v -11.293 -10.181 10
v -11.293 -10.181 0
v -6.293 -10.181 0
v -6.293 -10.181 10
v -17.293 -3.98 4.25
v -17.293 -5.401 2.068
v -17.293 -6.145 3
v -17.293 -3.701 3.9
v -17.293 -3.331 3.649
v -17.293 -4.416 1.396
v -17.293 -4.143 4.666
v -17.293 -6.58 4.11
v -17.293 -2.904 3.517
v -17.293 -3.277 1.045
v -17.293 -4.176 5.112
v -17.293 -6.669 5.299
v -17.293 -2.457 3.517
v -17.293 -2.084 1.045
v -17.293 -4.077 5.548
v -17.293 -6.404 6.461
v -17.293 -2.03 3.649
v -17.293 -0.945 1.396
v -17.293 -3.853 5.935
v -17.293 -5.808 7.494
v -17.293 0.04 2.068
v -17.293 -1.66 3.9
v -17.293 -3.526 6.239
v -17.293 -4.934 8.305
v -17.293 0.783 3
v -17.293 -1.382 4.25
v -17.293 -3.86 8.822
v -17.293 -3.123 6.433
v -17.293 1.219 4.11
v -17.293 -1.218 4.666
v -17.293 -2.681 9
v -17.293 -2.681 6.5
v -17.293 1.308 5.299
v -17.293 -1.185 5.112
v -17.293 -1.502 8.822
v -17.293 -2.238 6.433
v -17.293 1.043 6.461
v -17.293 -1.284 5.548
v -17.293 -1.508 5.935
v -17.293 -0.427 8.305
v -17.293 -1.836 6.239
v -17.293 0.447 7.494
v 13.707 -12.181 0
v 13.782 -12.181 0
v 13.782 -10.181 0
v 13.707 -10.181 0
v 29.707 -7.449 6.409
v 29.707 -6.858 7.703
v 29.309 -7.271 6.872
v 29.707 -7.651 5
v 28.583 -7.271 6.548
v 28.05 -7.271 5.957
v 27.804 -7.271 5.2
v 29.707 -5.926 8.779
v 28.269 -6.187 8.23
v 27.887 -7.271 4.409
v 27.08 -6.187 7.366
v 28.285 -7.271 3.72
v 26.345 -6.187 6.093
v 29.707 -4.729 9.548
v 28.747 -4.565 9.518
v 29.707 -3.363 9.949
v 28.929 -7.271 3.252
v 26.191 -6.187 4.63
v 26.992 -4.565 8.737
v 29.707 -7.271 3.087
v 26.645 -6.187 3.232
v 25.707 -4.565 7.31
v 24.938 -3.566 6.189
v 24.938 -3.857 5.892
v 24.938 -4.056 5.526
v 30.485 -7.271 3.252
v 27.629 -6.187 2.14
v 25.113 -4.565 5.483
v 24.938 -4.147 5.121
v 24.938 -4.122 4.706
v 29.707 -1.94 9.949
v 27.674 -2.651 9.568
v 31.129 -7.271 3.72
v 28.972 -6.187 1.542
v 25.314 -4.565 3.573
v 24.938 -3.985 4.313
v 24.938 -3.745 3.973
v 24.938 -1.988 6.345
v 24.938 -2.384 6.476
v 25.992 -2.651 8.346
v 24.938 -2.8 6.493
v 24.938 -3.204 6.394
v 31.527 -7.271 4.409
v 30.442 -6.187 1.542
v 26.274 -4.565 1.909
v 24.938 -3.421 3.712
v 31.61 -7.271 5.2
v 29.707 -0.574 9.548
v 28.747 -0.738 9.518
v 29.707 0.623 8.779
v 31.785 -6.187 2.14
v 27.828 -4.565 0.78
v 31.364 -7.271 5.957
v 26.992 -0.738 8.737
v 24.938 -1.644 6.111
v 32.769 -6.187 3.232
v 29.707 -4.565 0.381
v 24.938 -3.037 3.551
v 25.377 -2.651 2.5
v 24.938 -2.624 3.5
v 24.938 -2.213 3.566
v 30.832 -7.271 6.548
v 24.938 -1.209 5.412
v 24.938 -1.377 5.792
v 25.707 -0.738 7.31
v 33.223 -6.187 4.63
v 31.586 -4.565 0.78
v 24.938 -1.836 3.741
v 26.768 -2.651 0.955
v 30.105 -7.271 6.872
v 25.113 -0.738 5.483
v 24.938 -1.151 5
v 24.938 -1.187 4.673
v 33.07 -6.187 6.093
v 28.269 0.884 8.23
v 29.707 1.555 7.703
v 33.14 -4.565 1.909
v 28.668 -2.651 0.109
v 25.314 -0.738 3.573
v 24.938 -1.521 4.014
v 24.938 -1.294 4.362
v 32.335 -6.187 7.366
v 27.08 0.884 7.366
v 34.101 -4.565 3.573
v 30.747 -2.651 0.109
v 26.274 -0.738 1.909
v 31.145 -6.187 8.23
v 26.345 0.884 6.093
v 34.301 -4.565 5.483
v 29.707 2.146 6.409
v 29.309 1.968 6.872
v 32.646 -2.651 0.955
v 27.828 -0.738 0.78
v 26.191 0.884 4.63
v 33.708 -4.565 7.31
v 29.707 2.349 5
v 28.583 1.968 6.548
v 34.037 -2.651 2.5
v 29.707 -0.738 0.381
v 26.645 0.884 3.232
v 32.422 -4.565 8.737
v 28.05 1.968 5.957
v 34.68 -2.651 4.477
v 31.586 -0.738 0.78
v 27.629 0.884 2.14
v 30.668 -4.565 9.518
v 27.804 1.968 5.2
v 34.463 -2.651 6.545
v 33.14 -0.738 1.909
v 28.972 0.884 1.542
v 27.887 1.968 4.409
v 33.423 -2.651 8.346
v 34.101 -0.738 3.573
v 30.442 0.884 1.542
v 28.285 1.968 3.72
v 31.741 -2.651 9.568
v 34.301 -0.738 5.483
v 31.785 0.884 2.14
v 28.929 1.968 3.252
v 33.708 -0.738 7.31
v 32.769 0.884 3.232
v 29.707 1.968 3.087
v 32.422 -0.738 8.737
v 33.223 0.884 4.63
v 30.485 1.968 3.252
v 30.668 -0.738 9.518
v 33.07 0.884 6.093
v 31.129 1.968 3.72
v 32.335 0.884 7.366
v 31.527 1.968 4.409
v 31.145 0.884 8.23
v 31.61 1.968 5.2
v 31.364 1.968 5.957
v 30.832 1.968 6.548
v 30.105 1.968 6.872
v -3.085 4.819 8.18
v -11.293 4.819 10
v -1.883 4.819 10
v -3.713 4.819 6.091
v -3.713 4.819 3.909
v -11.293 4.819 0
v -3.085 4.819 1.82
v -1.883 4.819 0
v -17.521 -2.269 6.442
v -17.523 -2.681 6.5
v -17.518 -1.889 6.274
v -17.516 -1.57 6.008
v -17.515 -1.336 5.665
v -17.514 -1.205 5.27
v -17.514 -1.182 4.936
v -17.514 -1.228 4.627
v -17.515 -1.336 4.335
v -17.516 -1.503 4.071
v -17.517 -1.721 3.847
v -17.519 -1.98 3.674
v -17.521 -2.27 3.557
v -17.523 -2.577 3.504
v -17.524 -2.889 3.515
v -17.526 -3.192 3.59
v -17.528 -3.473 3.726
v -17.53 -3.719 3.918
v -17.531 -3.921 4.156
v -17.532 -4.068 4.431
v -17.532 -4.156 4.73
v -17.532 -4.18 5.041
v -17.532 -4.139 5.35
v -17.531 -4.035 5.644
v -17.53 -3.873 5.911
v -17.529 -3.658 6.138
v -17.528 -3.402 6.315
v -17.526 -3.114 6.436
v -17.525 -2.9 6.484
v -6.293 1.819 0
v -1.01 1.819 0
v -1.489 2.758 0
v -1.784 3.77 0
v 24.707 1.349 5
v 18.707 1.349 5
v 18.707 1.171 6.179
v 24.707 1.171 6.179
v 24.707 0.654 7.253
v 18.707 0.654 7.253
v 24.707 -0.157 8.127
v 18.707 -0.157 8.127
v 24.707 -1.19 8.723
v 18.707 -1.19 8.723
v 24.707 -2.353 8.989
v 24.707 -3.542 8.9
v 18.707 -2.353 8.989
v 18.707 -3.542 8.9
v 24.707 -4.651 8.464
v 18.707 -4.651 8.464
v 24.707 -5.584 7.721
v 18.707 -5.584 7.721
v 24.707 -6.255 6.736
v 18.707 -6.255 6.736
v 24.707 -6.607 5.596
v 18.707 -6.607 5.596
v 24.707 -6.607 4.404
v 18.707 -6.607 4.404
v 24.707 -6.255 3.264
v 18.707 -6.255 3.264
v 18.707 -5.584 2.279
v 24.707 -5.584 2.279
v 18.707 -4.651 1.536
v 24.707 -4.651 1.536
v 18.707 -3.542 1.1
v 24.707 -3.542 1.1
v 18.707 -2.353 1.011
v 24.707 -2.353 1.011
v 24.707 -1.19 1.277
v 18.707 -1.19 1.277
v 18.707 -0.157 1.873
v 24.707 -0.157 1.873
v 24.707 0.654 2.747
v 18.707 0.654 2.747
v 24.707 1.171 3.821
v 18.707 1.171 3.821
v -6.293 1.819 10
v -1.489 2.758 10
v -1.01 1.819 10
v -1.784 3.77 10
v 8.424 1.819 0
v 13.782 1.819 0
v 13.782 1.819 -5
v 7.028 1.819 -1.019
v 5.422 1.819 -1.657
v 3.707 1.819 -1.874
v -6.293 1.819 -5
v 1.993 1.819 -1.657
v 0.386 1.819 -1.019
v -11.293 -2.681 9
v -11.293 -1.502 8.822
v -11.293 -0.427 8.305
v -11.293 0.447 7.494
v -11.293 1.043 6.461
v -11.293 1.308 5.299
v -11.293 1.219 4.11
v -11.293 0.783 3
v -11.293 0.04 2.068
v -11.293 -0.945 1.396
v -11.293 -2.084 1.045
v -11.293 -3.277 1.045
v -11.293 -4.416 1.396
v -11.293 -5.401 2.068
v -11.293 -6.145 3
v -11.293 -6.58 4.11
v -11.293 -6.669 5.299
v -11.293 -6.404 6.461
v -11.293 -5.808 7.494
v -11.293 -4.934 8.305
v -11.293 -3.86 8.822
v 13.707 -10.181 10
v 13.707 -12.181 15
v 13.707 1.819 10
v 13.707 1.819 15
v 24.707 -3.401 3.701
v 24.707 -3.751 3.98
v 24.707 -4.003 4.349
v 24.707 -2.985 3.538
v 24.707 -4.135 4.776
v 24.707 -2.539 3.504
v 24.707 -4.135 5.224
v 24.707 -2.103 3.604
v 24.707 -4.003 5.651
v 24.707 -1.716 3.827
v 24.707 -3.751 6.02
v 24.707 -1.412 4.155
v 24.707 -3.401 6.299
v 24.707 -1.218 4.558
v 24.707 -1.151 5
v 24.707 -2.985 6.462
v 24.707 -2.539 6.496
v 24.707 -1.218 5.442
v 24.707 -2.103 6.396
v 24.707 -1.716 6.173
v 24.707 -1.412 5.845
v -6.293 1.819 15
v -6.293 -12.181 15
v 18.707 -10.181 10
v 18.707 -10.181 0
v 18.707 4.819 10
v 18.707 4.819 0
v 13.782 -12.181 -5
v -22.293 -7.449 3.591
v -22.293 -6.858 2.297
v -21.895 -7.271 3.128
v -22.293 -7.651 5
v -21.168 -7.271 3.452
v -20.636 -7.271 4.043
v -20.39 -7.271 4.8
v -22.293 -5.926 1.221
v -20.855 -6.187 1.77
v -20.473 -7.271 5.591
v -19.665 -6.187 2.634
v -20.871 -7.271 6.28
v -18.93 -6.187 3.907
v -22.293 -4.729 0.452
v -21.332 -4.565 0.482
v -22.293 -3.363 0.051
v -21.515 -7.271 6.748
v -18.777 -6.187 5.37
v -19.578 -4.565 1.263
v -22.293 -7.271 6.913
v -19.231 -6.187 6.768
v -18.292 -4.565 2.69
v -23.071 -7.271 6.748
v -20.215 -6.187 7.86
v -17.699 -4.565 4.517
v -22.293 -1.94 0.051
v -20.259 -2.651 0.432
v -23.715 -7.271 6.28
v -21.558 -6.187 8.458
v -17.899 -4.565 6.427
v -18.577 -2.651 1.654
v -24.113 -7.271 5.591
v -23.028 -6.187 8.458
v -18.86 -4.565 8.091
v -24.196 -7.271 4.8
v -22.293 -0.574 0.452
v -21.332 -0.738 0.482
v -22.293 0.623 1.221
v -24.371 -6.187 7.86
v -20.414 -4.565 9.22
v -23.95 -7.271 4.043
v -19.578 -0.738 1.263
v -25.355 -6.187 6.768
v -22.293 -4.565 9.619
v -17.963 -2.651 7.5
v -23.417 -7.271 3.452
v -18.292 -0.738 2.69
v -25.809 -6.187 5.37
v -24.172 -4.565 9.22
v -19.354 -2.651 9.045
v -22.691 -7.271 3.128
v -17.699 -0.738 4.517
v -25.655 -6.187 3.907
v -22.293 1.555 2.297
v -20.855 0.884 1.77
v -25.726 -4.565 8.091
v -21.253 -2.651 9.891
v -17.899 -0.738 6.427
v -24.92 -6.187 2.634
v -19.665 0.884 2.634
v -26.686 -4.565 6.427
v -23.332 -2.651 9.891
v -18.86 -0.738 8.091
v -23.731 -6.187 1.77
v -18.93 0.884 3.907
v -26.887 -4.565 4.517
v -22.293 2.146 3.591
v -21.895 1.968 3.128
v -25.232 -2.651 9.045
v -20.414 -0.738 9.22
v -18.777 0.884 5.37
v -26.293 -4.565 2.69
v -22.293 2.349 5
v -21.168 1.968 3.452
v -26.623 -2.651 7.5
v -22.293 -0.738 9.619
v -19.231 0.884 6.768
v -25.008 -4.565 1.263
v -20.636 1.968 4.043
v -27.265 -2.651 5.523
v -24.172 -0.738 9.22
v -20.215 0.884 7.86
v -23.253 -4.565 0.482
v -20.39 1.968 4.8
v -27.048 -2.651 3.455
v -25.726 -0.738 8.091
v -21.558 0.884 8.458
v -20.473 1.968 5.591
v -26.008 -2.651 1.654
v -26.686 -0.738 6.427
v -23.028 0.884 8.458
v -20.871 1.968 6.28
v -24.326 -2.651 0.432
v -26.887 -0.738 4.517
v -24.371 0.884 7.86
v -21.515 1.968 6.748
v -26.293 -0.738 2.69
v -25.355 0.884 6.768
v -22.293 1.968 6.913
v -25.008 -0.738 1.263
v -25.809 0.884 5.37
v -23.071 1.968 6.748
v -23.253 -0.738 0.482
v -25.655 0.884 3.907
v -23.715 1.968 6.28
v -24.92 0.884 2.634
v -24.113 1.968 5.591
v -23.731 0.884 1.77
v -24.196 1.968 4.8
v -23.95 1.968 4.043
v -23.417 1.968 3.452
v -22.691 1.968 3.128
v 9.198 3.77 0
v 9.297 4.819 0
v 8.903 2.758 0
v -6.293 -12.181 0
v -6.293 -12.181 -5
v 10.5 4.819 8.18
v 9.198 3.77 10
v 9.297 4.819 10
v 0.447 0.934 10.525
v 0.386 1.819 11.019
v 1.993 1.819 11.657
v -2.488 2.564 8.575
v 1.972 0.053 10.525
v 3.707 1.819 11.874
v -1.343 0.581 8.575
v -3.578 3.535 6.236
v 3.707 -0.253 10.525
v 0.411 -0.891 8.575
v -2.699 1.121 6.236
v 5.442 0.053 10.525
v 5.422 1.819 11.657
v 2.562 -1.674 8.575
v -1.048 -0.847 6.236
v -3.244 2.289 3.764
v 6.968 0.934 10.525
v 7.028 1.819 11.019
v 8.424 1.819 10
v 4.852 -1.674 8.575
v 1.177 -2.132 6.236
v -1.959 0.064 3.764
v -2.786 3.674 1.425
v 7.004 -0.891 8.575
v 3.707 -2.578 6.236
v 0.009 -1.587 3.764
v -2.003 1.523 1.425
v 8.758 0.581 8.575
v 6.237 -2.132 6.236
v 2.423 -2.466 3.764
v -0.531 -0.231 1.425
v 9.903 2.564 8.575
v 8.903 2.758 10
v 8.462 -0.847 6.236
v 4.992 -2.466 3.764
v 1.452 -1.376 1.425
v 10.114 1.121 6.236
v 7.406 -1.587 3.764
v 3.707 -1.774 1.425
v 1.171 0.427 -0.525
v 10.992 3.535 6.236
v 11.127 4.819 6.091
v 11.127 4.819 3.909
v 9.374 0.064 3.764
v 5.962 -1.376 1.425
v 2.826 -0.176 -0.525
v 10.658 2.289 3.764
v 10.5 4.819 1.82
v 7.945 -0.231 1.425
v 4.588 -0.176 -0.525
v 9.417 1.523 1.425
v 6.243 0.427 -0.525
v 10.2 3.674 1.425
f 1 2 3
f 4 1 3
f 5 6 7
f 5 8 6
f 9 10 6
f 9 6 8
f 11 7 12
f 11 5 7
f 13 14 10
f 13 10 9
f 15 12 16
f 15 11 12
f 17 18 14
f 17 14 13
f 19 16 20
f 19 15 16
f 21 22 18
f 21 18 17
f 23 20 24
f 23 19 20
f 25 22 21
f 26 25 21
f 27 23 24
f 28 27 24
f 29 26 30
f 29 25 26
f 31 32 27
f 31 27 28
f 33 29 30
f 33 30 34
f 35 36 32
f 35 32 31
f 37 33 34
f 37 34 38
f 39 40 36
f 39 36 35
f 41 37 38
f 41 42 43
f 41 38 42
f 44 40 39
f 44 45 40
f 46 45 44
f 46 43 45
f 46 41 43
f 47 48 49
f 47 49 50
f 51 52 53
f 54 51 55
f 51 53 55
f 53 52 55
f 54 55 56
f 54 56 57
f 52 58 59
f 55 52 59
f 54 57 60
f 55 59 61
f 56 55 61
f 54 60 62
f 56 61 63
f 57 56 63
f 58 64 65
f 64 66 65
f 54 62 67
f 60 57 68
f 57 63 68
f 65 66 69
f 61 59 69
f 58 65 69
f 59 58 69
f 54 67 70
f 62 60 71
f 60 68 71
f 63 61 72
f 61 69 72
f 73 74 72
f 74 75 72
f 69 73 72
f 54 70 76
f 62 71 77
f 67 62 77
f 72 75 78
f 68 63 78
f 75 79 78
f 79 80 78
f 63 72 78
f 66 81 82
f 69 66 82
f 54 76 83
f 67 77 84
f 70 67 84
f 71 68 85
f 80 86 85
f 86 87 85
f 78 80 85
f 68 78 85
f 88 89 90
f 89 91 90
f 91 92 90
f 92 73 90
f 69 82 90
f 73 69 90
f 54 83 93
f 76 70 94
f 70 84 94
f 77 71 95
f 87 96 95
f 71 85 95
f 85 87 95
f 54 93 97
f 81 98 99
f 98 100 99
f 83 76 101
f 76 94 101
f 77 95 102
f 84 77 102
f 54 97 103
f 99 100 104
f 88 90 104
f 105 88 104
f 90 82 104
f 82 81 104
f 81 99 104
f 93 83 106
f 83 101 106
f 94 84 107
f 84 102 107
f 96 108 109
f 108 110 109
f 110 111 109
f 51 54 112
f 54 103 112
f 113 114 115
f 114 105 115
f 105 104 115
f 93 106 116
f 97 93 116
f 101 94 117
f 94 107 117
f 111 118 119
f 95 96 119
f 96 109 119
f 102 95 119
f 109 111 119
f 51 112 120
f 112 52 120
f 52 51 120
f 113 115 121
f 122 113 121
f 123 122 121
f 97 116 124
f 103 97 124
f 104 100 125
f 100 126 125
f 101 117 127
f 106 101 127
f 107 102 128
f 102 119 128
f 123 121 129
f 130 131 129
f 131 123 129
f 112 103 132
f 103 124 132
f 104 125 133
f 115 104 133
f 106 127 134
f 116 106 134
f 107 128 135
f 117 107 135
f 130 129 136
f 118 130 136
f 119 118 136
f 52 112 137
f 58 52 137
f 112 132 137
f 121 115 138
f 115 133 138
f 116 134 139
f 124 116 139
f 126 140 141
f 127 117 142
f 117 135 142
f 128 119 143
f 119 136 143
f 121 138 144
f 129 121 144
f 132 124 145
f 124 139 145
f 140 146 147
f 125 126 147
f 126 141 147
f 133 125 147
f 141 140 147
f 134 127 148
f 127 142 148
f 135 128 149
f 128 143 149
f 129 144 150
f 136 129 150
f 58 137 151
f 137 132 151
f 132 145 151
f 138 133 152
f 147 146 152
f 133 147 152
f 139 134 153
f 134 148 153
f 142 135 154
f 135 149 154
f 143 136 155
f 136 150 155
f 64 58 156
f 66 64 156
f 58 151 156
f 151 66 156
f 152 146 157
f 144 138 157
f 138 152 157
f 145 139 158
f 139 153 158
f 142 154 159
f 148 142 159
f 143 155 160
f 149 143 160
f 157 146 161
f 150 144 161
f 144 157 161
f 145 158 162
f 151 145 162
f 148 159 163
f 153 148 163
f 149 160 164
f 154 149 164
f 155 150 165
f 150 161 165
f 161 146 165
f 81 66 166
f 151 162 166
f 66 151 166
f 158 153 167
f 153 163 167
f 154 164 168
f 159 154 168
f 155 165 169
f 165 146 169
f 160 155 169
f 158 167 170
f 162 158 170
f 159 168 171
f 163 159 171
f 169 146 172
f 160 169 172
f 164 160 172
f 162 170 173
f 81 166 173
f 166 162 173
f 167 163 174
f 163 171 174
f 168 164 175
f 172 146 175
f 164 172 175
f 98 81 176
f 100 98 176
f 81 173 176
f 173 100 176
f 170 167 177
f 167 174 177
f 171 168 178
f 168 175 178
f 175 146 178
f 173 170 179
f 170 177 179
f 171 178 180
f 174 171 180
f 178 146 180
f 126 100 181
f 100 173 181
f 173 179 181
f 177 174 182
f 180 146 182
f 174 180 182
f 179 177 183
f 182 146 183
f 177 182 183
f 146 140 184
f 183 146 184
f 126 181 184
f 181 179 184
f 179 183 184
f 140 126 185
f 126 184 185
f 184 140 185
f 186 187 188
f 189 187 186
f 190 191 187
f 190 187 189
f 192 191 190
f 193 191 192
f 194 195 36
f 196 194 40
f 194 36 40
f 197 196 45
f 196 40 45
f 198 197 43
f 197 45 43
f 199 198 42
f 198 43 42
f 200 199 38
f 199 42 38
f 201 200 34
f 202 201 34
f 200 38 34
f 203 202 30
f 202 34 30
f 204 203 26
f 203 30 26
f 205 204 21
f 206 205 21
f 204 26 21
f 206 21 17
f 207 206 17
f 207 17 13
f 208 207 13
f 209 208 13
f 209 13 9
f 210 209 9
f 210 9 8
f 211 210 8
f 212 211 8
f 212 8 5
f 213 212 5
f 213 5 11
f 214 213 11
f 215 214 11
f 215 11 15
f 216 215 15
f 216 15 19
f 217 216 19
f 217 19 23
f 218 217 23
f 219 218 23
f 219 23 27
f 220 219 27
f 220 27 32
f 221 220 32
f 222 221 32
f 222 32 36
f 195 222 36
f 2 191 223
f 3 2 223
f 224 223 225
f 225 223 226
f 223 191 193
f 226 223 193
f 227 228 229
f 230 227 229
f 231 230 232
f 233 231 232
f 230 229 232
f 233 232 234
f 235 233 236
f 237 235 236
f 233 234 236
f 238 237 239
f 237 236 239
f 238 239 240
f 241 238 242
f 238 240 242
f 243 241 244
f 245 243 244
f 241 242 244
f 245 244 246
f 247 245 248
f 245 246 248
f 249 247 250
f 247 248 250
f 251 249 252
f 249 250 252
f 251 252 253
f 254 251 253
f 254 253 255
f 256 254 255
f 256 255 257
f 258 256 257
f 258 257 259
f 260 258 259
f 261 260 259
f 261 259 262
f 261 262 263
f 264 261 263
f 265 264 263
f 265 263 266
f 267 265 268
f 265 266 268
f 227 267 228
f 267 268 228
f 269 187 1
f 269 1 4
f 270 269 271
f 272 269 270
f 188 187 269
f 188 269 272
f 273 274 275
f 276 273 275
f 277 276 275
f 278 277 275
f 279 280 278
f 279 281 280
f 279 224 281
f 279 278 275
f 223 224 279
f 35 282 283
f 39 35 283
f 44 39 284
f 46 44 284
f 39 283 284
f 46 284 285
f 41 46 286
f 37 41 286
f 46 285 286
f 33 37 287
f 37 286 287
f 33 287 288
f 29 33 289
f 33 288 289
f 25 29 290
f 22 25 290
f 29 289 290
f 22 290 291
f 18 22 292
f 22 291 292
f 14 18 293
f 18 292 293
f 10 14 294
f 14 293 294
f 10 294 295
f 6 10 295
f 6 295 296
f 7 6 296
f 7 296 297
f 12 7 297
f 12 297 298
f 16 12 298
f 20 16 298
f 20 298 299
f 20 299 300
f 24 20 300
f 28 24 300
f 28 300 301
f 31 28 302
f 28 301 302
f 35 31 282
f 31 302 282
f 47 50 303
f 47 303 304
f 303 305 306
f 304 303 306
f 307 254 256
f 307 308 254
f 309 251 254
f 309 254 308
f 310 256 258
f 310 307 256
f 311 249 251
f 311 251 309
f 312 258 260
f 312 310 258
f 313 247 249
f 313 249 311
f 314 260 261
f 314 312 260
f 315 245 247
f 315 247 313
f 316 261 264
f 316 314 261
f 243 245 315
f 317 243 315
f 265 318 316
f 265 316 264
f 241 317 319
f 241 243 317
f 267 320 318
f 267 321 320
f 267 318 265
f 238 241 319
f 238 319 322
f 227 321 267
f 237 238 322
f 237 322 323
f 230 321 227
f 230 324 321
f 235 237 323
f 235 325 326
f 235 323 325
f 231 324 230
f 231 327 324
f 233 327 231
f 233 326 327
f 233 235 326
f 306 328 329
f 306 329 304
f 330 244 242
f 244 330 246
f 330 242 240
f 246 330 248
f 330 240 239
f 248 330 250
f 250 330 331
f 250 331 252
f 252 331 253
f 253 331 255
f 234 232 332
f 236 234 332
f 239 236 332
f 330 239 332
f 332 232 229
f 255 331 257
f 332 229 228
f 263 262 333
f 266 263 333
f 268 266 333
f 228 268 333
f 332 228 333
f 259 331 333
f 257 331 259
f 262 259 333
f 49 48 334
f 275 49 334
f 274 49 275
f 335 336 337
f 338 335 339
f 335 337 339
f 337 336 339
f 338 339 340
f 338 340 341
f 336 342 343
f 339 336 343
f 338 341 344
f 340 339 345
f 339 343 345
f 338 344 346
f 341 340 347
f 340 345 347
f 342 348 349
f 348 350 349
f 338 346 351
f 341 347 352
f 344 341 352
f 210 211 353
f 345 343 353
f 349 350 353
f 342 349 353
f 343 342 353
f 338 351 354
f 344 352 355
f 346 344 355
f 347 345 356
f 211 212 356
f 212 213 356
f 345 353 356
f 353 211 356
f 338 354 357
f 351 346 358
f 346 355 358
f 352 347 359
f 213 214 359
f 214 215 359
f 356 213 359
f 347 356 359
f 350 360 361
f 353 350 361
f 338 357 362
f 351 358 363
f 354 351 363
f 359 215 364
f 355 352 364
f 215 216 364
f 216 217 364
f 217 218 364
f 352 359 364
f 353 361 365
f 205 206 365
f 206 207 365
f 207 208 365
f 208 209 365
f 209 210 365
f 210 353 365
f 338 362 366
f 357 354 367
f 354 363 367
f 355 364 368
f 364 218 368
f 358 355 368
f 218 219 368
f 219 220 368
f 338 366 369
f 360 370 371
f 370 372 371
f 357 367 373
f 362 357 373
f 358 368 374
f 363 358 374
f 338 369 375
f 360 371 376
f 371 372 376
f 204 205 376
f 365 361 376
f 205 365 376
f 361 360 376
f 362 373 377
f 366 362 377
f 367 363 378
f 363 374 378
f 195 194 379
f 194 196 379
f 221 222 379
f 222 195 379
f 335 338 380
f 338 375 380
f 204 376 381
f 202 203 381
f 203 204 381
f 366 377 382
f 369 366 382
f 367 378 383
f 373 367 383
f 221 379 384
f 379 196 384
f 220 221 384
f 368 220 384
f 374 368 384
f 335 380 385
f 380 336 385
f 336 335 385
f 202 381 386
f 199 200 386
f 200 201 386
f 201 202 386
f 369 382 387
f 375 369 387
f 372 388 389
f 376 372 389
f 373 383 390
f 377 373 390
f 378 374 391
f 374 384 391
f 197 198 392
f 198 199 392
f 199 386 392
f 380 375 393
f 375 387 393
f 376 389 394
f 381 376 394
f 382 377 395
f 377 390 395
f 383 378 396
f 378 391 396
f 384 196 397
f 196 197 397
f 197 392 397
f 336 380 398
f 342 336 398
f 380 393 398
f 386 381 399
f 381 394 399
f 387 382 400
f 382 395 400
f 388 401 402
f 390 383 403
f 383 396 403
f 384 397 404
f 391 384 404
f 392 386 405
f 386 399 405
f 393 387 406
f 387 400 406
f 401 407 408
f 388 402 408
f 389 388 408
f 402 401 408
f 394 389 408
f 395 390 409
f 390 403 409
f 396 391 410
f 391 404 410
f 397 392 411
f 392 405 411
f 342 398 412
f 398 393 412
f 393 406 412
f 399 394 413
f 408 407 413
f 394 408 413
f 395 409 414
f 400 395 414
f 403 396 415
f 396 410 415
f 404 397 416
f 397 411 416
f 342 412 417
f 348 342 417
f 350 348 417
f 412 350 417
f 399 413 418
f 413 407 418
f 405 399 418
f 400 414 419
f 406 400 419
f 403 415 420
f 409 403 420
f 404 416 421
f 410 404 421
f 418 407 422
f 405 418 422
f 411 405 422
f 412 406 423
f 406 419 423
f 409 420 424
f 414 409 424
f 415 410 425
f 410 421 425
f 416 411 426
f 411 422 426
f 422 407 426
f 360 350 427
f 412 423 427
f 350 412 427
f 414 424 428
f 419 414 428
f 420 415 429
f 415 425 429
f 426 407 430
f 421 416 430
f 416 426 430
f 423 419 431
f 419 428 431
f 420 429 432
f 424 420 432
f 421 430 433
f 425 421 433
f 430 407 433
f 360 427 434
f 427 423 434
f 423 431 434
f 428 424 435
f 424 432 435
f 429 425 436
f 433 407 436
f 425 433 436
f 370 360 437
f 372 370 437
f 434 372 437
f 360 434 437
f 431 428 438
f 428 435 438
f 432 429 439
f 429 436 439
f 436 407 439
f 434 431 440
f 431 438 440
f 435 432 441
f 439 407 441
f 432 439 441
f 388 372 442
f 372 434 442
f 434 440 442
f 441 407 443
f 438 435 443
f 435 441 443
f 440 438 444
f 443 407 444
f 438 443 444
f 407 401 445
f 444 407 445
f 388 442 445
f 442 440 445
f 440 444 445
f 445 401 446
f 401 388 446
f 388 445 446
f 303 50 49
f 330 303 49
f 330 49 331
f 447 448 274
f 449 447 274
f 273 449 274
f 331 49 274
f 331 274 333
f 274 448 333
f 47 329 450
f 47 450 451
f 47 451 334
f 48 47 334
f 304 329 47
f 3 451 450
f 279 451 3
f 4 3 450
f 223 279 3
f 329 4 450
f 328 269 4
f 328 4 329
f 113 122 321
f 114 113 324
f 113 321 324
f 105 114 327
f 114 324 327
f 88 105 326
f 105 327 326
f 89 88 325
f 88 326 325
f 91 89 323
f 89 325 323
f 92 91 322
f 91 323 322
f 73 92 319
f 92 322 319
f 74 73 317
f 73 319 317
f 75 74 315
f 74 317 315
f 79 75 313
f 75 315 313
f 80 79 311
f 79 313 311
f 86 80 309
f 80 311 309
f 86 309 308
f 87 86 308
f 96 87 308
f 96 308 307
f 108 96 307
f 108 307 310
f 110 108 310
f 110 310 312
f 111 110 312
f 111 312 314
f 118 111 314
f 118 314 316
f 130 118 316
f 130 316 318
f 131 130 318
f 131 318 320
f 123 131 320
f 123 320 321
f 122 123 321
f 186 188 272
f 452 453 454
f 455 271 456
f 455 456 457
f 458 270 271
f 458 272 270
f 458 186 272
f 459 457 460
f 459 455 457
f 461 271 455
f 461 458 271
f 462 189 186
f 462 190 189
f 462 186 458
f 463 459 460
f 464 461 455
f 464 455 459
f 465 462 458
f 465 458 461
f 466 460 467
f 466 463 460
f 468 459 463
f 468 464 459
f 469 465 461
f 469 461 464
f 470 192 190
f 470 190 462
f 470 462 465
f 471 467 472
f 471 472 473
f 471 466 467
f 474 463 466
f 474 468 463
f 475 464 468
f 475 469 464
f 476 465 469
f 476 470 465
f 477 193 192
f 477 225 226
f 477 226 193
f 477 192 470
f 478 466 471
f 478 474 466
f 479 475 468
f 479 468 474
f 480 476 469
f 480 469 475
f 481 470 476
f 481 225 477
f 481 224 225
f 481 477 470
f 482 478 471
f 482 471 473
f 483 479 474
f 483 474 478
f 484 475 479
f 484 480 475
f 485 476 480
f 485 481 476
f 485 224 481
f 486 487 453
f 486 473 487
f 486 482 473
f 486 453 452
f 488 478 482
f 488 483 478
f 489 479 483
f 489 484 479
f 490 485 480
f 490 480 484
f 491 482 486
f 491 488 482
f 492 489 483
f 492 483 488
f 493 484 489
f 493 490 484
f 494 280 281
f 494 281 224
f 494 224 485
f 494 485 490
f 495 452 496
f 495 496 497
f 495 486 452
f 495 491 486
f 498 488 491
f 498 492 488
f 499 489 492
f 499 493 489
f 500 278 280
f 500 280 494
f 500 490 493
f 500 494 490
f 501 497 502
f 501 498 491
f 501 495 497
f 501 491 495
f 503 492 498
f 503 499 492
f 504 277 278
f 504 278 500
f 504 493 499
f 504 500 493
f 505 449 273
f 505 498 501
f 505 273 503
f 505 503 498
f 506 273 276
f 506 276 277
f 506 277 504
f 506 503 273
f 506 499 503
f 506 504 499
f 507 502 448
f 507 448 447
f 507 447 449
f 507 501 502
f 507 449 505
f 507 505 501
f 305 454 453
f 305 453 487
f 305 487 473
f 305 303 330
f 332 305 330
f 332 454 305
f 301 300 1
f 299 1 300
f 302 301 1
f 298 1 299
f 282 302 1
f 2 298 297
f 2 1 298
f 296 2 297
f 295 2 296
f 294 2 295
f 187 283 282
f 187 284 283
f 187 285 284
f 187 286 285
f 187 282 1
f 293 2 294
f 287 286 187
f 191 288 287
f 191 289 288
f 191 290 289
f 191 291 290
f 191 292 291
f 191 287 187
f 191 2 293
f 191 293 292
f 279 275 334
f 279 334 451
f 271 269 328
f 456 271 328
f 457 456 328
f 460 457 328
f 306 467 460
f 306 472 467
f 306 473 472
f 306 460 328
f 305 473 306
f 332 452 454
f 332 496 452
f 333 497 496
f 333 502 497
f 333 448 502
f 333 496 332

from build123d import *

# Parameters (mm, degrees)
SKETCH1_W            = 30
SKETCH1_H            = 15
BOSS_EXTRUDE1_DEPTH  = 10
SKETCH2_W            = 20
SKETCH2_H            = 14
BOSS_EXTRUDE2_DEPTH  = 5
SKETCH3_W            = 20.074773711
SKETCH3_H            = 14
BOSS_EXTRUDE3_DEPTH  = 5
SKETCH4_W            = 20
SKETCH4_H            = 10
BOSS_EXTRUDE4_DEPTH  = 2
SKETCH5_R            = 4
BOSS_EXTRUDE6_DEPTH  = 6
SKETCH6_R            = 4
BOSS_EXTRUDE7_DEPTH  = 6
SKETCH8_R            = 1.5
BOSS_EXTRUDE9_DEPTH  = 5
SKETCH10_R           = 1.5
BOSS_EXTRUDE10_DEPTH = 5


with BuildPart() as part:
    # Sketch1 → Boss-Extrude1 (new body)
    with BuildSketch(Plane.XY):
        with Locations((3.707224335, -2.680608365)):
            Rectangle(SKETCH1_W, SKETCH1_H)
    extrude(amount=BOSS_EXTRUDE1_DEPTH)

    # Sketch2 → Boss-Extrude2 (add)
    with BuildSketch(Plane.XY.offset(10)):
        with Locations((3.707224335, -5.180608365)):
            Rectangle(SKETCH2_W, SKETCH2_H)
    extrude(amount=BOSS_EXTRUDE2_DEPTH)

    # Sketch3 → Boss-Extrude3 (add)
    with BuildSketch(Plane(origin=(0, 0, 0), x_dir=(-1, 0, 0), z_dir=(0, 0, -1))):
        with Locations((-3.74461119, -5.180608365)):
            Rectangle(SKETCH3_W, SKETCH3_H)
    extrude(amount=BOSS_EXTRUDE3_DEPTH)

    # Sketch4 → Boss-Extrude4 (add)
    with BuildSketch(Plane.XZ.offset(10.180608365)):
        with Locations((3.707224335, 5)):
            Rectangle(SKETCH4_W, SKETCH4_H)
    extrude(amount=BOSS_EXTRUDE4_DEPTH)

    # Sketch5 → Boss-Extrude6 (add)
    with BuildSketch(Plane(origin=(18.707224335, 0, 0), x_dir=(0, 0, -1), z_dir=(1, 0, 0))):
        with Locations(Location((-5, -2.651445807, 0), (0, 0, 90))):
            Circle(SKETCH5_R)
    extrude(amount=BOSS_EXTRUDE6_DEPTH)

    # Sketch6 → Boss-Extrude7 (add)
    with BuildSketch(Plane.ZY.offset(11.292775665)):
        with Locations((5, -2.680608365)):
            Circle(SKETCH6_R)
    extrude(amount=BOSS_EXTRUDE7_DEPTH)

    # Sketch8 → Boss-Extrude9 (add)
    with BuildSketch(Plane.ZY.offset(17.292775665)):
        with Locations((5, -2.680608365)):
            Circle(SKETCH8_R)
    extrude(amount=BOSS_EXTRUDE9_DEPTH)

    # Sketch10 → Boss-Extrude10 (add)
    with BuildSketch(Plane(origin=(24.707224335, 0, 0), x_dir=(0, 0, -1), z_dir=(1, 0, 0))):
        with Locations(Location((-5, -2.651445807, 0), (0, 0, 90))):
            Circle(SKETCH10_R)
    extrude(amount=BOSS_EXTRUDE10_DEPTH)

    # Sketch9 → Revolve3 (revolve)
    with BuildSketch(Plane.ZY.offset(22.292775665)):
        with BuildLine():
            Line((5, 2.348554193), (5, -7.651445807))
            ThreePointArc((5, -7.651445807), (0, -2.651445807), (5, 2.348554193))
        make_face()
    revolve(axis=Axis((-22.292775665, 2.348554193, 5), (0, -1, 0)))

    # Sketch11 → Revolve4 (revolve)
    with BuildSketch(Plane(origin=(29.707224335, 0, 0), x_dir=(0, 0, -1), z_dir=(1, 0, 0))):
        with BuildLine():
            Line((-5, 2.348554193), (-5, -7.651445807))
            ThreePointArc((-5, -7.651445807), (-10, -2.651445807), (-5, 2.348554193))
        make_face()
    revolve(axis=Axis((29.707224335, 2.348554193, 5), (0, -1, 0)))

    # Sketch7 → Cut-Revolve2 (revolve, cut)
    with BuildSketch(Plane(origin=(0, 4.819391635, 0), x_dir=(1, 0, 0), z_dir=(0, 1, 0))):
        with BuildLine():
            Line((3.707224335, 2.5), (3.707224335, -12.5))
            ThreePointArc((3.707224335, -12.5), (-3.792775665, -5), (3.707224335, 2.5))
        make_face()
    revolve(axis=Axis((3.707224335, 4.819391635, -2.5), (0, 0, 1)), mode=Mode.SUBTRACT)


solid = part.part
